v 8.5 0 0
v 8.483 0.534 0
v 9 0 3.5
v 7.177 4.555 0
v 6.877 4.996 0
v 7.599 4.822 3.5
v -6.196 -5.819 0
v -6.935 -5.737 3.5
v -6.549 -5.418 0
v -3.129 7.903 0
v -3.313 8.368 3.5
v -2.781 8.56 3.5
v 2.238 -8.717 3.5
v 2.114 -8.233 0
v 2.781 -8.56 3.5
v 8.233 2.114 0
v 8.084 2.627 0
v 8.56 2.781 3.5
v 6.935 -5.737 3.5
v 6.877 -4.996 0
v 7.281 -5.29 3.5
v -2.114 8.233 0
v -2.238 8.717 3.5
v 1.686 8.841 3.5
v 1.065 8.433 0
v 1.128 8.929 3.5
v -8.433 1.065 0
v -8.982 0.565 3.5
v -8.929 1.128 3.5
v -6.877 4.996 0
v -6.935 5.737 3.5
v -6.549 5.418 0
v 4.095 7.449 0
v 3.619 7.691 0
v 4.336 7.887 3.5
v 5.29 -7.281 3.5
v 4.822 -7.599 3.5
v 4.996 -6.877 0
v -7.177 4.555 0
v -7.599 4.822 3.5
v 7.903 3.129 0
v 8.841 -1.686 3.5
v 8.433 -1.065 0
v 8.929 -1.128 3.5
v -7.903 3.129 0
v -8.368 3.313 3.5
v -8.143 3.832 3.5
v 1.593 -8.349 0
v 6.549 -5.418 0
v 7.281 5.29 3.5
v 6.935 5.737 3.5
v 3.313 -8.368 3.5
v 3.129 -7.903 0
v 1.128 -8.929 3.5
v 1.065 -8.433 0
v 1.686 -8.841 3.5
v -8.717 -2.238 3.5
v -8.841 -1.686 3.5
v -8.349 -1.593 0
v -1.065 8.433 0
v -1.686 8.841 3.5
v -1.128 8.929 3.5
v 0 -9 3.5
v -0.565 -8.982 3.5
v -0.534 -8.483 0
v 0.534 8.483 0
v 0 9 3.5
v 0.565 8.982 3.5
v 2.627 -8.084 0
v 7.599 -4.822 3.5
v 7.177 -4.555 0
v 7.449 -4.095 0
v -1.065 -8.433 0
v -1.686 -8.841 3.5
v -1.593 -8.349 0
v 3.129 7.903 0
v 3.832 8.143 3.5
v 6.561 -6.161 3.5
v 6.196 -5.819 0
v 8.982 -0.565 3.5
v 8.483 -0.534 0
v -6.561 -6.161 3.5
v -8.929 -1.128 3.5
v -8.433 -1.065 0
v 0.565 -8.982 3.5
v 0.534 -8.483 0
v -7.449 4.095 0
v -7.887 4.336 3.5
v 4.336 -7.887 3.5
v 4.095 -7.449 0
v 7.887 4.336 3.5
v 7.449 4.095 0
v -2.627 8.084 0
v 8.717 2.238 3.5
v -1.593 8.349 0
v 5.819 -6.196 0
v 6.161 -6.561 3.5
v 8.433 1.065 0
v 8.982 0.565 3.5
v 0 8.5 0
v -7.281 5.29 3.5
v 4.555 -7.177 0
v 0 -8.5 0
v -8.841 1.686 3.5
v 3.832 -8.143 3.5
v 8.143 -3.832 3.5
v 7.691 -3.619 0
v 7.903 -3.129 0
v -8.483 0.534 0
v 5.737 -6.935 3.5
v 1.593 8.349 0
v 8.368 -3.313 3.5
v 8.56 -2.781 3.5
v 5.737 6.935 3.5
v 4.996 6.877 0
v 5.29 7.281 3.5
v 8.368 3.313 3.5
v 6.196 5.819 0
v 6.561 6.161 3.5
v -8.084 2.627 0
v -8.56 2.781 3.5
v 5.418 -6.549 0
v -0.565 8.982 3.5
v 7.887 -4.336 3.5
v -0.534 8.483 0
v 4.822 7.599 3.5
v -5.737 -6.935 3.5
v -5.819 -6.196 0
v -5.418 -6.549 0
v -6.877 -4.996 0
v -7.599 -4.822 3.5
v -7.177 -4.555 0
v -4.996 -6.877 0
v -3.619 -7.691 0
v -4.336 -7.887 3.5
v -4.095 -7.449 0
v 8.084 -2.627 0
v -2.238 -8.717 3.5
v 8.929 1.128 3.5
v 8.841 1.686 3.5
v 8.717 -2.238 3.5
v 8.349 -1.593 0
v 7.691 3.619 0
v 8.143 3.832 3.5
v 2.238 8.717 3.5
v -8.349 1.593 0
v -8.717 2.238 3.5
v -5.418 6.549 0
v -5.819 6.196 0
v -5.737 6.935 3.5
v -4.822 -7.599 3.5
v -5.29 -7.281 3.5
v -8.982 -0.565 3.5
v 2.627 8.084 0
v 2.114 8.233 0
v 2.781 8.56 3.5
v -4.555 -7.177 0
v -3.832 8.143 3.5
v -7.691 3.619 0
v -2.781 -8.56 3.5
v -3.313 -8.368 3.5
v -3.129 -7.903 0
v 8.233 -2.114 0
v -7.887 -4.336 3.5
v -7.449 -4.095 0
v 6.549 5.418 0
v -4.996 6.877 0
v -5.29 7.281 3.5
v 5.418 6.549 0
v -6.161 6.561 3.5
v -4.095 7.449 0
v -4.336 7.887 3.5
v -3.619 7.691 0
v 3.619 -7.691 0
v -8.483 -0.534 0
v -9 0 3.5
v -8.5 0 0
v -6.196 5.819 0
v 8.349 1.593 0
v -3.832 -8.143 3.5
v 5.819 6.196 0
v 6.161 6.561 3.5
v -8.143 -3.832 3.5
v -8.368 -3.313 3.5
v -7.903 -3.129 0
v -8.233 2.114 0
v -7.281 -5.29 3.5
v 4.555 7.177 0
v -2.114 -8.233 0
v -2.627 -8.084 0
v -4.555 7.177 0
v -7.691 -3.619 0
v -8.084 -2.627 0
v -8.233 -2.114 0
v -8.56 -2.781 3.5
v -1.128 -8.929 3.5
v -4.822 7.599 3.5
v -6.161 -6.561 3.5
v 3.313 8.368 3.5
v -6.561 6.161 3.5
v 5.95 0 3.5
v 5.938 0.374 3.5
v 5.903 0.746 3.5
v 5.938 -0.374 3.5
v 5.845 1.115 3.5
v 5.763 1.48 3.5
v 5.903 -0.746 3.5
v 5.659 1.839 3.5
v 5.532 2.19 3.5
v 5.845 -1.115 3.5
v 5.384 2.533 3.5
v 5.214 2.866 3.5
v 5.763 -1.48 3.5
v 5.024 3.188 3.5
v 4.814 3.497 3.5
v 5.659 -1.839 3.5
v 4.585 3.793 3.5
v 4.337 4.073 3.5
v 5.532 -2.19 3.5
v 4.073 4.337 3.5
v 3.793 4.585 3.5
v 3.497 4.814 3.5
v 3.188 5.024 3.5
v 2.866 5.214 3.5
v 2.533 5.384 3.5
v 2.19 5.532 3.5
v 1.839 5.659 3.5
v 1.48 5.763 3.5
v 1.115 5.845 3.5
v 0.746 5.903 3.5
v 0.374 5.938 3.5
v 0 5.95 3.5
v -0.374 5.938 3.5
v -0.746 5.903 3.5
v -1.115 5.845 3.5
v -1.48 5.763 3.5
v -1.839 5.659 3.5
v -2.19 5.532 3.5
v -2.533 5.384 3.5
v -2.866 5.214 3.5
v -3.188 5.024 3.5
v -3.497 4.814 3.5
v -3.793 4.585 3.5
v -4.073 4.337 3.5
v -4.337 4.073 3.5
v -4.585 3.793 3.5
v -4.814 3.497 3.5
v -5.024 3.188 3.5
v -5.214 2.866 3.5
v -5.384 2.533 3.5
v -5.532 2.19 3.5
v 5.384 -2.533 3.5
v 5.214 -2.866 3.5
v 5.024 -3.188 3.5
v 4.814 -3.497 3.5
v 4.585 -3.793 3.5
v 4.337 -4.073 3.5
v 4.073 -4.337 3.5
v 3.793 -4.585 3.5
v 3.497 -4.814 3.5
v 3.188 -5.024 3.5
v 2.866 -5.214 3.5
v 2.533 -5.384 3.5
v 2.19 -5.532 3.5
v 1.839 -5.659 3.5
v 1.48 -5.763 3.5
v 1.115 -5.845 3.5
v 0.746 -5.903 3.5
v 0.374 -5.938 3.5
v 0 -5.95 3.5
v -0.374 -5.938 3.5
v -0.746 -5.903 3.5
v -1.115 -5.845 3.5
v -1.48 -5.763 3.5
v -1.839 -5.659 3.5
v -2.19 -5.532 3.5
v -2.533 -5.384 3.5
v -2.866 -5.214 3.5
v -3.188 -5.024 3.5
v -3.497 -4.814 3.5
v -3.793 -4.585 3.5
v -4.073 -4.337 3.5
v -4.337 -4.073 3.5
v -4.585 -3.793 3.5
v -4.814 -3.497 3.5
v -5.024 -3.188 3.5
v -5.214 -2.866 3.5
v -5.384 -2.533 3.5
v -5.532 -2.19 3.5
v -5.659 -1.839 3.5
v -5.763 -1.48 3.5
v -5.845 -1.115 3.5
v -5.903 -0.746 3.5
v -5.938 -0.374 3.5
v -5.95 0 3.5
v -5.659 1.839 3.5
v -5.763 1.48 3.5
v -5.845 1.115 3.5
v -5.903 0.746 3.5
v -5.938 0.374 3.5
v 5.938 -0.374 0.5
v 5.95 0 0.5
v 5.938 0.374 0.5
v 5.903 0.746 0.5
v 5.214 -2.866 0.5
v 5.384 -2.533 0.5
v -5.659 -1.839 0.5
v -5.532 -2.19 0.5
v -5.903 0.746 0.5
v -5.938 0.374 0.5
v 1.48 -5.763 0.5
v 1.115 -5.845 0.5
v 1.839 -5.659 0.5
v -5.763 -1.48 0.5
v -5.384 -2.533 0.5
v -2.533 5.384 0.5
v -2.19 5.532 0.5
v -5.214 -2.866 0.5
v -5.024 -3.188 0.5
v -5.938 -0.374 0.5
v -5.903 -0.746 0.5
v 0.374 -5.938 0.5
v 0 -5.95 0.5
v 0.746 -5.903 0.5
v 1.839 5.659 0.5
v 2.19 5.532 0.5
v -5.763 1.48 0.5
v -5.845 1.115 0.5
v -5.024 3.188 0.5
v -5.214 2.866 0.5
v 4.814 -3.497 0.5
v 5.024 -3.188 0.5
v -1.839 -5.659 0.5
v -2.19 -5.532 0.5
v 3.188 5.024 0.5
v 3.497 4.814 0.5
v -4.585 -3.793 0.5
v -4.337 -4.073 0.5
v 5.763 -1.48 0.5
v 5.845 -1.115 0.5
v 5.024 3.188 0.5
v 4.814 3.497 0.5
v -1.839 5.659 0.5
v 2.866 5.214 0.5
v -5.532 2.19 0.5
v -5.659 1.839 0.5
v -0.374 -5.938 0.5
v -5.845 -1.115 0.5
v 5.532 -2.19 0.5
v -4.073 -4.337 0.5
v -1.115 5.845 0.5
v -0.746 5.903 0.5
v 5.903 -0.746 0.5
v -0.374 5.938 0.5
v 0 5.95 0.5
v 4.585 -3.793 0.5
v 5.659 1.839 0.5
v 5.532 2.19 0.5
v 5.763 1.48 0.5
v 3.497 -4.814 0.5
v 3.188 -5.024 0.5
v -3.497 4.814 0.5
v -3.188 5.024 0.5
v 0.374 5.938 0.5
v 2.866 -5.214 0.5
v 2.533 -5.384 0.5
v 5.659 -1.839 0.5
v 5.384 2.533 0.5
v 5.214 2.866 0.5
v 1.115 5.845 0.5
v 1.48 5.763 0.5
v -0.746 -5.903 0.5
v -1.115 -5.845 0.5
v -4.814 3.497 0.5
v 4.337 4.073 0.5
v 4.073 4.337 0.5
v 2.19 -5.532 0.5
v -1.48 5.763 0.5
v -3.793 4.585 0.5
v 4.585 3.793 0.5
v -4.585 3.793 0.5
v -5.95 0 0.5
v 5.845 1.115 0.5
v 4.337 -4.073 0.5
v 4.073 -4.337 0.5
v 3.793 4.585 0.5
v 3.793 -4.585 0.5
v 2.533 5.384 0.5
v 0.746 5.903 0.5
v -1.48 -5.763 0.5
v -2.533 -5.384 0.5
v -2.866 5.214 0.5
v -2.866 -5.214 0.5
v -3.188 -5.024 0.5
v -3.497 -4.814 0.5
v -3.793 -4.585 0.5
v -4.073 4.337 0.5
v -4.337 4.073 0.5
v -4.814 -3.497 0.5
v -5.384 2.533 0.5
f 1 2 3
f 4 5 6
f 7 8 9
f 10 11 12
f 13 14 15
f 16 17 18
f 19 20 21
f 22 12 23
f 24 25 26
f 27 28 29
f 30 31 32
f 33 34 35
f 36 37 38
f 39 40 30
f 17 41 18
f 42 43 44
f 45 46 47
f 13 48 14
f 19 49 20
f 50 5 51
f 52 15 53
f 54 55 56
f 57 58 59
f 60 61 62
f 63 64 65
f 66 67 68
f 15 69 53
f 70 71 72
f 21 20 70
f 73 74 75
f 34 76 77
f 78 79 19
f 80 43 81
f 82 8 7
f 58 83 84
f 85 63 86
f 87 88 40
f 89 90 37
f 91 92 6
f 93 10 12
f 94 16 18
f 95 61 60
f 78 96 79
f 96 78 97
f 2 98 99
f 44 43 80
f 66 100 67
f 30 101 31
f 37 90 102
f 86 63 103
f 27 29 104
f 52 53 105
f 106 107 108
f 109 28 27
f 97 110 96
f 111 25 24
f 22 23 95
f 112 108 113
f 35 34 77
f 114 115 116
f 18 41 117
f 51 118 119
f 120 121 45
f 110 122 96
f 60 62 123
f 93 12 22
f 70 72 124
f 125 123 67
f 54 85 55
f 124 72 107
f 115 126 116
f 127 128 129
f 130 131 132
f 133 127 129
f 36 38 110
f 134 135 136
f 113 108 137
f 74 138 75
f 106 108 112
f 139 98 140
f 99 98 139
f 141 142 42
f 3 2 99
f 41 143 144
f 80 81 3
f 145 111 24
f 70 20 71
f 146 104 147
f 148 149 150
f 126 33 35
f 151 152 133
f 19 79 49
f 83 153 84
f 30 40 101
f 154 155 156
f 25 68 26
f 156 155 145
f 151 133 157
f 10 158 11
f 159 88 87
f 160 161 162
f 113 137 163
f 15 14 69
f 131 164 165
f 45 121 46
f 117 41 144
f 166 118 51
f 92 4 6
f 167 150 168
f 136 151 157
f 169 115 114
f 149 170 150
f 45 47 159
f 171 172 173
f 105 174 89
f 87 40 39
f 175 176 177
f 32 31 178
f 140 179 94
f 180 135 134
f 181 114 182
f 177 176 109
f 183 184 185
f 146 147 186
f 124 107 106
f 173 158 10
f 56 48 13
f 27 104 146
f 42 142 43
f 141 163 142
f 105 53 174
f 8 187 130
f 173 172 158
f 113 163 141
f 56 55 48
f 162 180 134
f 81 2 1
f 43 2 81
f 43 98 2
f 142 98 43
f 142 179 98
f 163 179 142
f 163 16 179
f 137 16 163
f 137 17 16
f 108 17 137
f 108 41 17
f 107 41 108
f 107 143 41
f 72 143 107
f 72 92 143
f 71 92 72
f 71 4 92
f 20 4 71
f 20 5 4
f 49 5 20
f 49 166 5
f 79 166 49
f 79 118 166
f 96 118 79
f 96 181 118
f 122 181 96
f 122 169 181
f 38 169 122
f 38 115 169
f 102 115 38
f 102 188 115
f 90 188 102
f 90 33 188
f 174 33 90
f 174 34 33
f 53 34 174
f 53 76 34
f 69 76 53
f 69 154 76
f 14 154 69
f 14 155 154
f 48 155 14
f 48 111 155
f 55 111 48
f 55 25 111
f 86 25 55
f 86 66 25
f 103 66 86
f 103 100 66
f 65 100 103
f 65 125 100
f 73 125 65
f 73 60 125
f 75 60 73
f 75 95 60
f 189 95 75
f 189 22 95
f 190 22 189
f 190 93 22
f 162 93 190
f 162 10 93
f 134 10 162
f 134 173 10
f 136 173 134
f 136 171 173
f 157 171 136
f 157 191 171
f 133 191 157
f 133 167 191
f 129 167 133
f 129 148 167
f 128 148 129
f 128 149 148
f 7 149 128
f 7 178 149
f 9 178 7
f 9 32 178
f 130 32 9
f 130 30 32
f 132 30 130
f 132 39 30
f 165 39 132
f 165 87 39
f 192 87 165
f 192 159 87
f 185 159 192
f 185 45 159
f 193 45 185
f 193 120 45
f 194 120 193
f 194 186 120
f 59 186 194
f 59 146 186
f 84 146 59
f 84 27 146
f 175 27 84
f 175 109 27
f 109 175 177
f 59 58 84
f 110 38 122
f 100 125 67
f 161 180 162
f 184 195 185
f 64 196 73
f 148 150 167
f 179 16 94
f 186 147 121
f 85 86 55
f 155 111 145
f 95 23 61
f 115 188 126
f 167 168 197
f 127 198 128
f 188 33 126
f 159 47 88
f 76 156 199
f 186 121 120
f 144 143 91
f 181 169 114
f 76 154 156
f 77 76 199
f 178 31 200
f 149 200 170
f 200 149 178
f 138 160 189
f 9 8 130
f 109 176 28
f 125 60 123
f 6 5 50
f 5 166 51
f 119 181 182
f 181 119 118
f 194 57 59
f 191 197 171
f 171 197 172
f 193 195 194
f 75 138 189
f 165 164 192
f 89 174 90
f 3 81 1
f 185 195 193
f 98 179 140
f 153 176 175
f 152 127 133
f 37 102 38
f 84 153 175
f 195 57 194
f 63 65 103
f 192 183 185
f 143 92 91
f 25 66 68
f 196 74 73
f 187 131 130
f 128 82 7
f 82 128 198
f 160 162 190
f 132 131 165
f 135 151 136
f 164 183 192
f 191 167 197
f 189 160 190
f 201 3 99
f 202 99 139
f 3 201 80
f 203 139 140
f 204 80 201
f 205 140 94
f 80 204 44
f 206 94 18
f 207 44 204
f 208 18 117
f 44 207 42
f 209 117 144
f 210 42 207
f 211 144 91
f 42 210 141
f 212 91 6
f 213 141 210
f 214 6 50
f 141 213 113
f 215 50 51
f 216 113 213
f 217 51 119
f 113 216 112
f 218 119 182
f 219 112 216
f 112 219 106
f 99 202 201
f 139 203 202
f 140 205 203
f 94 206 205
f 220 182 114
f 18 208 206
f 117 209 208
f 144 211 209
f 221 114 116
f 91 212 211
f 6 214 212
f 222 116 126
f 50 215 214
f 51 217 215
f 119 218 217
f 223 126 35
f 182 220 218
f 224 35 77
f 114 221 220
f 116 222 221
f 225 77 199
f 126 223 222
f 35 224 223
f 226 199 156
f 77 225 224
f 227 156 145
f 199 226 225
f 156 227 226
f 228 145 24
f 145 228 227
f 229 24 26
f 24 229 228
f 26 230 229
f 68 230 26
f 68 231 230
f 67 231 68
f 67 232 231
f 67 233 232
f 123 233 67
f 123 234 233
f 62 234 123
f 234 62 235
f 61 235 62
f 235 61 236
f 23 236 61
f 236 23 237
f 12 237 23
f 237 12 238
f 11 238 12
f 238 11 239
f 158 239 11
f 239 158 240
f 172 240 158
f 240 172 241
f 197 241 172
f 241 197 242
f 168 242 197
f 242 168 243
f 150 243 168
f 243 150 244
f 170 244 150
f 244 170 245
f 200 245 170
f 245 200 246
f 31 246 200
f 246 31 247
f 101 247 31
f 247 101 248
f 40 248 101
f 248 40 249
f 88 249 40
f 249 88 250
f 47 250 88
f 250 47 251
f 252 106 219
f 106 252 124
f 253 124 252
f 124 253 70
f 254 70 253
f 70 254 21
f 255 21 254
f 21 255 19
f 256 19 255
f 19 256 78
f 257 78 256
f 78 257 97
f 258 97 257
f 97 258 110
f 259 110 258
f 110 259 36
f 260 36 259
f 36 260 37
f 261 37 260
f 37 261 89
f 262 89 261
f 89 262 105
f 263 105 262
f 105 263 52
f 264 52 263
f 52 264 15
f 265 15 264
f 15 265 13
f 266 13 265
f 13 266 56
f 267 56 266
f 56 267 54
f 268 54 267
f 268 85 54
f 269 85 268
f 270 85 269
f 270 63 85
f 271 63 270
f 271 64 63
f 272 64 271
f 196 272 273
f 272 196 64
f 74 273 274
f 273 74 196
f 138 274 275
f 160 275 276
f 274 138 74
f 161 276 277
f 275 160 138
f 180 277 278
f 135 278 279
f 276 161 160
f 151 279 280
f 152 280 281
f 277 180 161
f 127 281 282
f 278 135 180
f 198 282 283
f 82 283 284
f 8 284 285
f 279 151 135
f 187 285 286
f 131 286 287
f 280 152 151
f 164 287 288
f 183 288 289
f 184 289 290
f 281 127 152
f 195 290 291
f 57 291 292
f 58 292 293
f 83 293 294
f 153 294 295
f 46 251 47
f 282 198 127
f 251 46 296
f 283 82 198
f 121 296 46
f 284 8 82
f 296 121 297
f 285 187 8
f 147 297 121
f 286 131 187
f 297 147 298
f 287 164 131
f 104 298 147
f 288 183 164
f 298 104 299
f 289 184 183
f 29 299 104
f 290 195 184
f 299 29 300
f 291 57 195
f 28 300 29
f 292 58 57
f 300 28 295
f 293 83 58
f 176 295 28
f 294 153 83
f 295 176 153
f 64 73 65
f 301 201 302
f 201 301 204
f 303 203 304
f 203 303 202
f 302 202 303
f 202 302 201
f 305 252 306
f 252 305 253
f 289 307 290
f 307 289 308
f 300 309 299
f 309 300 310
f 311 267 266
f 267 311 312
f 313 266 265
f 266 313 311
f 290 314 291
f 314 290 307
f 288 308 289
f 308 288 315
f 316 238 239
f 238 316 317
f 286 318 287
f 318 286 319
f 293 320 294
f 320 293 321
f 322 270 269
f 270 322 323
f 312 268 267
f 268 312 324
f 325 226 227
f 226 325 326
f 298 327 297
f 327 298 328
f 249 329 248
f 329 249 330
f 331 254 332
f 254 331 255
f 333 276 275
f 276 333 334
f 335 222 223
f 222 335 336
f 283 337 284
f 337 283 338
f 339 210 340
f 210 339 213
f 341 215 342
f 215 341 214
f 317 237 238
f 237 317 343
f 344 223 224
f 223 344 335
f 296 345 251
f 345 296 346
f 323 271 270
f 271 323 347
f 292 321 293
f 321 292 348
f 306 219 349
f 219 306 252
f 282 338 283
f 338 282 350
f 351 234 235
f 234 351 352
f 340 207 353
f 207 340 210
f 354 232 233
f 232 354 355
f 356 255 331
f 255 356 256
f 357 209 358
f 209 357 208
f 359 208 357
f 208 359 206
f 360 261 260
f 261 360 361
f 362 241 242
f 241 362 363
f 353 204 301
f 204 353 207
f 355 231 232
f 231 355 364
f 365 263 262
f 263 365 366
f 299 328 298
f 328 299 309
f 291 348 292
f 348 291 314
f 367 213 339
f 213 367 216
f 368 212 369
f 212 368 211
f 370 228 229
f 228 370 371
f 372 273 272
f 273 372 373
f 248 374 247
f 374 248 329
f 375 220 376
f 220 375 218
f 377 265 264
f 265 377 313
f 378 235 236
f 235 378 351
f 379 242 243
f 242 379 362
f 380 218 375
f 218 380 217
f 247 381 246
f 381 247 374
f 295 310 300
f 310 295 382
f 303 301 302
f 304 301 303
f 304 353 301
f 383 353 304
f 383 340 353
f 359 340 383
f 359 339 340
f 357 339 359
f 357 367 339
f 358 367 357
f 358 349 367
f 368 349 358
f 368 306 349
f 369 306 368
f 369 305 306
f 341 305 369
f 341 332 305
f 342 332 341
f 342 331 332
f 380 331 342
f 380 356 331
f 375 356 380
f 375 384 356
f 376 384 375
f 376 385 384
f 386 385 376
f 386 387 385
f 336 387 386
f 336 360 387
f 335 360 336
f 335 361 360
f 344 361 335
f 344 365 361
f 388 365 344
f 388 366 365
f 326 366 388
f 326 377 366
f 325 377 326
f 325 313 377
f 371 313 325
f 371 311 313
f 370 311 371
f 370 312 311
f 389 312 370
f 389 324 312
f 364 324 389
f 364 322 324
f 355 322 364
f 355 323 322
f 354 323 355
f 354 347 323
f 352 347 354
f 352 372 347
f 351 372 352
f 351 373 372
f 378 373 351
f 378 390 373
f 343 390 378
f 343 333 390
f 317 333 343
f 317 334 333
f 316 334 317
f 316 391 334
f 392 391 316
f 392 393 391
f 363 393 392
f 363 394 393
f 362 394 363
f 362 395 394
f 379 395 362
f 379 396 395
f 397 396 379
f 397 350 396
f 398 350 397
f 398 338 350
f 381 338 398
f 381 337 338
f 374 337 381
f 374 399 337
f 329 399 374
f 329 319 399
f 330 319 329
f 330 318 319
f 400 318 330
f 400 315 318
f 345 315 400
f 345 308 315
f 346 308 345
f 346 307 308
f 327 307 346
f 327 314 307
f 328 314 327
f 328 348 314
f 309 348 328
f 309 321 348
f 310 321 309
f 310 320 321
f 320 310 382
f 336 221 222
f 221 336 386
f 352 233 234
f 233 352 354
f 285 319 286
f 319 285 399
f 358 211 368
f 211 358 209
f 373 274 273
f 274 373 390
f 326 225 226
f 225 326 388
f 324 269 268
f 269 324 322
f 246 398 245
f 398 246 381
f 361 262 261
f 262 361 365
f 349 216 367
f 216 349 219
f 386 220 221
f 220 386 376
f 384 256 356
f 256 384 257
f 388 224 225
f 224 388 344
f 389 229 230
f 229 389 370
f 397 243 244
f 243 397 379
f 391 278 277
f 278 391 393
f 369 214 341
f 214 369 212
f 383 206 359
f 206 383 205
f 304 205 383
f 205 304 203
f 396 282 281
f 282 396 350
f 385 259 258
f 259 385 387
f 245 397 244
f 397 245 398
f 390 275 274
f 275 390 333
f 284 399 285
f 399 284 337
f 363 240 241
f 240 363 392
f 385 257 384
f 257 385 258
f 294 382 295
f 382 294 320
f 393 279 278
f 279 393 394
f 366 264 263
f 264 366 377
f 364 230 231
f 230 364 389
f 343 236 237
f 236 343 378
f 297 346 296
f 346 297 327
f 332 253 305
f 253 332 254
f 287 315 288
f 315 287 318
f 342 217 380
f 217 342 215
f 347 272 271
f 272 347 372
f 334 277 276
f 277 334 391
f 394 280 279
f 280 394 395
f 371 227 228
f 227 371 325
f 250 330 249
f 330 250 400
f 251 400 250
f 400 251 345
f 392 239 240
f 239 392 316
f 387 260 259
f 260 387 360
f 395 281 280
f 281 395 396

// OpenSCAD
// Plastic adaptor guard with upward taper and cylindrical recess (no flange)
// https://openscad.cloud/openscad/

top_diameter = 18;     // Wider top
bottom_diameter = 17;  // Narrower base
height = 3.5;
recess_diameter = 11.90;
recess_depth = 3;

difference() {
    // Tapered frustum body
    cylinder(h=height, d1=bottom_diameter, d2=top_diameter, $fn=100);

    // Cylindrical recess cuts into the top
    translate([0, 0, height - recess_depth]) {
        cylinder(d=recess_diameter, h=recess_depth + 0.2, $fn=100);
    }
}
